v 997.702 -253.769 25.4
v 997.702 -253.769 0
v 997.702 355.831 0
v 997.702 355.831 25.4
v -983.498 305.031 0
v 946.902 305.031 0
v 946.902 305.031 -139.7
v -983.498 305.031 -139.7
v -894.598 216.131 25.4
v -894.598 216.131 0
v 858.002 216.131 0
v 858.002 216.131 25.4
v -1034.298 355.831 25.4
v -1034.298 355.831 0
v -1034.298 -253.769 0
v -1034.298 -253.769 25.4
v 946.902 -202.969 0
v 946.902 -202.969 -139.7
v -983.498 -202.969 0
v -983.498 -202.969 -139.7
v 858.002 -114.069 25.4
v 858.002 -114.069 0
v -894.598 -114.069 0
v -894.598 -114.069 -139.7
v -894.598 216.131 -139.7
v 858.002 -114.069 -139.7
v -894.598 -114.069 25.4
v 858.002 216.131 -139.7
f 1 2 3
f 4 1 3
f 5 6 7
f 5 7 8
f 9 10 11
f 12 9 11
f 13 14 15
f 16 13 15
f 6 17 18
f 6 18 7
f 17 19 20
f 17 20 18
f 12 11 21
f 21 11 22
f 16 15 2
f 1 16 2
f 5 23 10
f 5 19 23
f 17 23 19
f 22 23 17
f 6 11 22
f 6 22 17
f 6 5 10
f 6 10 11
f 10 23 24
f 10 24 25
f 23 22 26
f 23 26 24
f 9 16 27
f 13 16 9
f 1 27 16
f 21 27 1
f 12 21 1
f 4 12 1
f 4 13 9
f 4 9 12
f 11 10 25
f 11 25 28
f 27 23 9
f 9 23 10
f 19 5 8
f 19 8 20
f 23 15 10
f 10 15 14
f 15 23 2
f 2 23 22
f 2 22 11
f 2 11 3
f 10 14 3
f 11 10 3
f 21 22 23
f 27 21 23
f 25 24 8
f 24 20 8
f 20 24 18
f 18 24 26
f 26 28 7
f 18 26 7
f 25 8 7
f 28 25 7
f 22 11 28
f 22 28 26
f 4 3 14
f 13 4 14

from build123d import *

# Parameters (mm, degrees)
F1_DEPTH = 25.4
F2_DEPTH = 139.7


with BuildPart() as f1:
    # F0 (on Top) → F1 (new body)
    with BuildSketch(Plane.XY):
        Polygon((-983.498255, 305.031293), (-1034.298255, 355.831293), (-1034.298255, -253.768707), (-983.498255, -202.968707), align=None)
        Polygon((997.701745, 355.831293), (-1034.298255, 355.831293), (-983.498255, 305.031293), (946.901745, 305.031293), align=None)
        Polygon((997.701745, -253.768707), (997.701745, 355.831293), (946.901745, 305.031293), (946.901745, -202.968707), align=None)
        Polygon((-983.498255, -202.968707), (-1034.298255, -253.768707), (997.701745, -253.768707), (946.901745, -202.968707), align=None)
        Polygon((-894.598255, 216.131293), (-983.498255, 305.031293), (-983.498255, -202.968707), (-894.598255, -114.068707), align=None)
        Polygon((946.901745, 305.031293), (-983.498255, 305.031293), (-894.598255, 216.131293), (858.001745, 216.131293), align=None)
        Polygon((946.901745, -202.968707), (946.901745, 305.031293), (858.001745, 216.131293), (858.001745, -114.068707), align=None)
        Polygon((-894.598255, -114.068707), (-983.498255, -202.968707), (946.901745, -202.968707), (858.001745, -114.068707), align=None)
    extrude(amount=F1_DEPTH)


with BuildPart() as f2:
    # F0 (on Top) → F2 (new body)
    with BuildSketch(Plane.XY):
        Polygon((-894.598255, 216.131293), (-983.498255, 305.031293), (-983.498255, -202.968707), (-894.598255, -114.068707), align=None)
        Polygon((-894.598255, -114.068707), (-983.498255, -202.968707), (946.901745, -202.968707), (858.001745, -114.068707), align=None)
        Polygon((946.901745, -202.968707), (946.901745, 305.031293), (858.001745, 216.131293), (858.001745, -114.068707), align=None)
        Polygon((946.901745, 305.031293), (-983.498255, 305.031293), (-894.598255, 216.131293), (858.001745, 216.131293), align=None)
    extrude(amount=-F2_DEPTH)


solid = Compound([f1.part, f2.part])
